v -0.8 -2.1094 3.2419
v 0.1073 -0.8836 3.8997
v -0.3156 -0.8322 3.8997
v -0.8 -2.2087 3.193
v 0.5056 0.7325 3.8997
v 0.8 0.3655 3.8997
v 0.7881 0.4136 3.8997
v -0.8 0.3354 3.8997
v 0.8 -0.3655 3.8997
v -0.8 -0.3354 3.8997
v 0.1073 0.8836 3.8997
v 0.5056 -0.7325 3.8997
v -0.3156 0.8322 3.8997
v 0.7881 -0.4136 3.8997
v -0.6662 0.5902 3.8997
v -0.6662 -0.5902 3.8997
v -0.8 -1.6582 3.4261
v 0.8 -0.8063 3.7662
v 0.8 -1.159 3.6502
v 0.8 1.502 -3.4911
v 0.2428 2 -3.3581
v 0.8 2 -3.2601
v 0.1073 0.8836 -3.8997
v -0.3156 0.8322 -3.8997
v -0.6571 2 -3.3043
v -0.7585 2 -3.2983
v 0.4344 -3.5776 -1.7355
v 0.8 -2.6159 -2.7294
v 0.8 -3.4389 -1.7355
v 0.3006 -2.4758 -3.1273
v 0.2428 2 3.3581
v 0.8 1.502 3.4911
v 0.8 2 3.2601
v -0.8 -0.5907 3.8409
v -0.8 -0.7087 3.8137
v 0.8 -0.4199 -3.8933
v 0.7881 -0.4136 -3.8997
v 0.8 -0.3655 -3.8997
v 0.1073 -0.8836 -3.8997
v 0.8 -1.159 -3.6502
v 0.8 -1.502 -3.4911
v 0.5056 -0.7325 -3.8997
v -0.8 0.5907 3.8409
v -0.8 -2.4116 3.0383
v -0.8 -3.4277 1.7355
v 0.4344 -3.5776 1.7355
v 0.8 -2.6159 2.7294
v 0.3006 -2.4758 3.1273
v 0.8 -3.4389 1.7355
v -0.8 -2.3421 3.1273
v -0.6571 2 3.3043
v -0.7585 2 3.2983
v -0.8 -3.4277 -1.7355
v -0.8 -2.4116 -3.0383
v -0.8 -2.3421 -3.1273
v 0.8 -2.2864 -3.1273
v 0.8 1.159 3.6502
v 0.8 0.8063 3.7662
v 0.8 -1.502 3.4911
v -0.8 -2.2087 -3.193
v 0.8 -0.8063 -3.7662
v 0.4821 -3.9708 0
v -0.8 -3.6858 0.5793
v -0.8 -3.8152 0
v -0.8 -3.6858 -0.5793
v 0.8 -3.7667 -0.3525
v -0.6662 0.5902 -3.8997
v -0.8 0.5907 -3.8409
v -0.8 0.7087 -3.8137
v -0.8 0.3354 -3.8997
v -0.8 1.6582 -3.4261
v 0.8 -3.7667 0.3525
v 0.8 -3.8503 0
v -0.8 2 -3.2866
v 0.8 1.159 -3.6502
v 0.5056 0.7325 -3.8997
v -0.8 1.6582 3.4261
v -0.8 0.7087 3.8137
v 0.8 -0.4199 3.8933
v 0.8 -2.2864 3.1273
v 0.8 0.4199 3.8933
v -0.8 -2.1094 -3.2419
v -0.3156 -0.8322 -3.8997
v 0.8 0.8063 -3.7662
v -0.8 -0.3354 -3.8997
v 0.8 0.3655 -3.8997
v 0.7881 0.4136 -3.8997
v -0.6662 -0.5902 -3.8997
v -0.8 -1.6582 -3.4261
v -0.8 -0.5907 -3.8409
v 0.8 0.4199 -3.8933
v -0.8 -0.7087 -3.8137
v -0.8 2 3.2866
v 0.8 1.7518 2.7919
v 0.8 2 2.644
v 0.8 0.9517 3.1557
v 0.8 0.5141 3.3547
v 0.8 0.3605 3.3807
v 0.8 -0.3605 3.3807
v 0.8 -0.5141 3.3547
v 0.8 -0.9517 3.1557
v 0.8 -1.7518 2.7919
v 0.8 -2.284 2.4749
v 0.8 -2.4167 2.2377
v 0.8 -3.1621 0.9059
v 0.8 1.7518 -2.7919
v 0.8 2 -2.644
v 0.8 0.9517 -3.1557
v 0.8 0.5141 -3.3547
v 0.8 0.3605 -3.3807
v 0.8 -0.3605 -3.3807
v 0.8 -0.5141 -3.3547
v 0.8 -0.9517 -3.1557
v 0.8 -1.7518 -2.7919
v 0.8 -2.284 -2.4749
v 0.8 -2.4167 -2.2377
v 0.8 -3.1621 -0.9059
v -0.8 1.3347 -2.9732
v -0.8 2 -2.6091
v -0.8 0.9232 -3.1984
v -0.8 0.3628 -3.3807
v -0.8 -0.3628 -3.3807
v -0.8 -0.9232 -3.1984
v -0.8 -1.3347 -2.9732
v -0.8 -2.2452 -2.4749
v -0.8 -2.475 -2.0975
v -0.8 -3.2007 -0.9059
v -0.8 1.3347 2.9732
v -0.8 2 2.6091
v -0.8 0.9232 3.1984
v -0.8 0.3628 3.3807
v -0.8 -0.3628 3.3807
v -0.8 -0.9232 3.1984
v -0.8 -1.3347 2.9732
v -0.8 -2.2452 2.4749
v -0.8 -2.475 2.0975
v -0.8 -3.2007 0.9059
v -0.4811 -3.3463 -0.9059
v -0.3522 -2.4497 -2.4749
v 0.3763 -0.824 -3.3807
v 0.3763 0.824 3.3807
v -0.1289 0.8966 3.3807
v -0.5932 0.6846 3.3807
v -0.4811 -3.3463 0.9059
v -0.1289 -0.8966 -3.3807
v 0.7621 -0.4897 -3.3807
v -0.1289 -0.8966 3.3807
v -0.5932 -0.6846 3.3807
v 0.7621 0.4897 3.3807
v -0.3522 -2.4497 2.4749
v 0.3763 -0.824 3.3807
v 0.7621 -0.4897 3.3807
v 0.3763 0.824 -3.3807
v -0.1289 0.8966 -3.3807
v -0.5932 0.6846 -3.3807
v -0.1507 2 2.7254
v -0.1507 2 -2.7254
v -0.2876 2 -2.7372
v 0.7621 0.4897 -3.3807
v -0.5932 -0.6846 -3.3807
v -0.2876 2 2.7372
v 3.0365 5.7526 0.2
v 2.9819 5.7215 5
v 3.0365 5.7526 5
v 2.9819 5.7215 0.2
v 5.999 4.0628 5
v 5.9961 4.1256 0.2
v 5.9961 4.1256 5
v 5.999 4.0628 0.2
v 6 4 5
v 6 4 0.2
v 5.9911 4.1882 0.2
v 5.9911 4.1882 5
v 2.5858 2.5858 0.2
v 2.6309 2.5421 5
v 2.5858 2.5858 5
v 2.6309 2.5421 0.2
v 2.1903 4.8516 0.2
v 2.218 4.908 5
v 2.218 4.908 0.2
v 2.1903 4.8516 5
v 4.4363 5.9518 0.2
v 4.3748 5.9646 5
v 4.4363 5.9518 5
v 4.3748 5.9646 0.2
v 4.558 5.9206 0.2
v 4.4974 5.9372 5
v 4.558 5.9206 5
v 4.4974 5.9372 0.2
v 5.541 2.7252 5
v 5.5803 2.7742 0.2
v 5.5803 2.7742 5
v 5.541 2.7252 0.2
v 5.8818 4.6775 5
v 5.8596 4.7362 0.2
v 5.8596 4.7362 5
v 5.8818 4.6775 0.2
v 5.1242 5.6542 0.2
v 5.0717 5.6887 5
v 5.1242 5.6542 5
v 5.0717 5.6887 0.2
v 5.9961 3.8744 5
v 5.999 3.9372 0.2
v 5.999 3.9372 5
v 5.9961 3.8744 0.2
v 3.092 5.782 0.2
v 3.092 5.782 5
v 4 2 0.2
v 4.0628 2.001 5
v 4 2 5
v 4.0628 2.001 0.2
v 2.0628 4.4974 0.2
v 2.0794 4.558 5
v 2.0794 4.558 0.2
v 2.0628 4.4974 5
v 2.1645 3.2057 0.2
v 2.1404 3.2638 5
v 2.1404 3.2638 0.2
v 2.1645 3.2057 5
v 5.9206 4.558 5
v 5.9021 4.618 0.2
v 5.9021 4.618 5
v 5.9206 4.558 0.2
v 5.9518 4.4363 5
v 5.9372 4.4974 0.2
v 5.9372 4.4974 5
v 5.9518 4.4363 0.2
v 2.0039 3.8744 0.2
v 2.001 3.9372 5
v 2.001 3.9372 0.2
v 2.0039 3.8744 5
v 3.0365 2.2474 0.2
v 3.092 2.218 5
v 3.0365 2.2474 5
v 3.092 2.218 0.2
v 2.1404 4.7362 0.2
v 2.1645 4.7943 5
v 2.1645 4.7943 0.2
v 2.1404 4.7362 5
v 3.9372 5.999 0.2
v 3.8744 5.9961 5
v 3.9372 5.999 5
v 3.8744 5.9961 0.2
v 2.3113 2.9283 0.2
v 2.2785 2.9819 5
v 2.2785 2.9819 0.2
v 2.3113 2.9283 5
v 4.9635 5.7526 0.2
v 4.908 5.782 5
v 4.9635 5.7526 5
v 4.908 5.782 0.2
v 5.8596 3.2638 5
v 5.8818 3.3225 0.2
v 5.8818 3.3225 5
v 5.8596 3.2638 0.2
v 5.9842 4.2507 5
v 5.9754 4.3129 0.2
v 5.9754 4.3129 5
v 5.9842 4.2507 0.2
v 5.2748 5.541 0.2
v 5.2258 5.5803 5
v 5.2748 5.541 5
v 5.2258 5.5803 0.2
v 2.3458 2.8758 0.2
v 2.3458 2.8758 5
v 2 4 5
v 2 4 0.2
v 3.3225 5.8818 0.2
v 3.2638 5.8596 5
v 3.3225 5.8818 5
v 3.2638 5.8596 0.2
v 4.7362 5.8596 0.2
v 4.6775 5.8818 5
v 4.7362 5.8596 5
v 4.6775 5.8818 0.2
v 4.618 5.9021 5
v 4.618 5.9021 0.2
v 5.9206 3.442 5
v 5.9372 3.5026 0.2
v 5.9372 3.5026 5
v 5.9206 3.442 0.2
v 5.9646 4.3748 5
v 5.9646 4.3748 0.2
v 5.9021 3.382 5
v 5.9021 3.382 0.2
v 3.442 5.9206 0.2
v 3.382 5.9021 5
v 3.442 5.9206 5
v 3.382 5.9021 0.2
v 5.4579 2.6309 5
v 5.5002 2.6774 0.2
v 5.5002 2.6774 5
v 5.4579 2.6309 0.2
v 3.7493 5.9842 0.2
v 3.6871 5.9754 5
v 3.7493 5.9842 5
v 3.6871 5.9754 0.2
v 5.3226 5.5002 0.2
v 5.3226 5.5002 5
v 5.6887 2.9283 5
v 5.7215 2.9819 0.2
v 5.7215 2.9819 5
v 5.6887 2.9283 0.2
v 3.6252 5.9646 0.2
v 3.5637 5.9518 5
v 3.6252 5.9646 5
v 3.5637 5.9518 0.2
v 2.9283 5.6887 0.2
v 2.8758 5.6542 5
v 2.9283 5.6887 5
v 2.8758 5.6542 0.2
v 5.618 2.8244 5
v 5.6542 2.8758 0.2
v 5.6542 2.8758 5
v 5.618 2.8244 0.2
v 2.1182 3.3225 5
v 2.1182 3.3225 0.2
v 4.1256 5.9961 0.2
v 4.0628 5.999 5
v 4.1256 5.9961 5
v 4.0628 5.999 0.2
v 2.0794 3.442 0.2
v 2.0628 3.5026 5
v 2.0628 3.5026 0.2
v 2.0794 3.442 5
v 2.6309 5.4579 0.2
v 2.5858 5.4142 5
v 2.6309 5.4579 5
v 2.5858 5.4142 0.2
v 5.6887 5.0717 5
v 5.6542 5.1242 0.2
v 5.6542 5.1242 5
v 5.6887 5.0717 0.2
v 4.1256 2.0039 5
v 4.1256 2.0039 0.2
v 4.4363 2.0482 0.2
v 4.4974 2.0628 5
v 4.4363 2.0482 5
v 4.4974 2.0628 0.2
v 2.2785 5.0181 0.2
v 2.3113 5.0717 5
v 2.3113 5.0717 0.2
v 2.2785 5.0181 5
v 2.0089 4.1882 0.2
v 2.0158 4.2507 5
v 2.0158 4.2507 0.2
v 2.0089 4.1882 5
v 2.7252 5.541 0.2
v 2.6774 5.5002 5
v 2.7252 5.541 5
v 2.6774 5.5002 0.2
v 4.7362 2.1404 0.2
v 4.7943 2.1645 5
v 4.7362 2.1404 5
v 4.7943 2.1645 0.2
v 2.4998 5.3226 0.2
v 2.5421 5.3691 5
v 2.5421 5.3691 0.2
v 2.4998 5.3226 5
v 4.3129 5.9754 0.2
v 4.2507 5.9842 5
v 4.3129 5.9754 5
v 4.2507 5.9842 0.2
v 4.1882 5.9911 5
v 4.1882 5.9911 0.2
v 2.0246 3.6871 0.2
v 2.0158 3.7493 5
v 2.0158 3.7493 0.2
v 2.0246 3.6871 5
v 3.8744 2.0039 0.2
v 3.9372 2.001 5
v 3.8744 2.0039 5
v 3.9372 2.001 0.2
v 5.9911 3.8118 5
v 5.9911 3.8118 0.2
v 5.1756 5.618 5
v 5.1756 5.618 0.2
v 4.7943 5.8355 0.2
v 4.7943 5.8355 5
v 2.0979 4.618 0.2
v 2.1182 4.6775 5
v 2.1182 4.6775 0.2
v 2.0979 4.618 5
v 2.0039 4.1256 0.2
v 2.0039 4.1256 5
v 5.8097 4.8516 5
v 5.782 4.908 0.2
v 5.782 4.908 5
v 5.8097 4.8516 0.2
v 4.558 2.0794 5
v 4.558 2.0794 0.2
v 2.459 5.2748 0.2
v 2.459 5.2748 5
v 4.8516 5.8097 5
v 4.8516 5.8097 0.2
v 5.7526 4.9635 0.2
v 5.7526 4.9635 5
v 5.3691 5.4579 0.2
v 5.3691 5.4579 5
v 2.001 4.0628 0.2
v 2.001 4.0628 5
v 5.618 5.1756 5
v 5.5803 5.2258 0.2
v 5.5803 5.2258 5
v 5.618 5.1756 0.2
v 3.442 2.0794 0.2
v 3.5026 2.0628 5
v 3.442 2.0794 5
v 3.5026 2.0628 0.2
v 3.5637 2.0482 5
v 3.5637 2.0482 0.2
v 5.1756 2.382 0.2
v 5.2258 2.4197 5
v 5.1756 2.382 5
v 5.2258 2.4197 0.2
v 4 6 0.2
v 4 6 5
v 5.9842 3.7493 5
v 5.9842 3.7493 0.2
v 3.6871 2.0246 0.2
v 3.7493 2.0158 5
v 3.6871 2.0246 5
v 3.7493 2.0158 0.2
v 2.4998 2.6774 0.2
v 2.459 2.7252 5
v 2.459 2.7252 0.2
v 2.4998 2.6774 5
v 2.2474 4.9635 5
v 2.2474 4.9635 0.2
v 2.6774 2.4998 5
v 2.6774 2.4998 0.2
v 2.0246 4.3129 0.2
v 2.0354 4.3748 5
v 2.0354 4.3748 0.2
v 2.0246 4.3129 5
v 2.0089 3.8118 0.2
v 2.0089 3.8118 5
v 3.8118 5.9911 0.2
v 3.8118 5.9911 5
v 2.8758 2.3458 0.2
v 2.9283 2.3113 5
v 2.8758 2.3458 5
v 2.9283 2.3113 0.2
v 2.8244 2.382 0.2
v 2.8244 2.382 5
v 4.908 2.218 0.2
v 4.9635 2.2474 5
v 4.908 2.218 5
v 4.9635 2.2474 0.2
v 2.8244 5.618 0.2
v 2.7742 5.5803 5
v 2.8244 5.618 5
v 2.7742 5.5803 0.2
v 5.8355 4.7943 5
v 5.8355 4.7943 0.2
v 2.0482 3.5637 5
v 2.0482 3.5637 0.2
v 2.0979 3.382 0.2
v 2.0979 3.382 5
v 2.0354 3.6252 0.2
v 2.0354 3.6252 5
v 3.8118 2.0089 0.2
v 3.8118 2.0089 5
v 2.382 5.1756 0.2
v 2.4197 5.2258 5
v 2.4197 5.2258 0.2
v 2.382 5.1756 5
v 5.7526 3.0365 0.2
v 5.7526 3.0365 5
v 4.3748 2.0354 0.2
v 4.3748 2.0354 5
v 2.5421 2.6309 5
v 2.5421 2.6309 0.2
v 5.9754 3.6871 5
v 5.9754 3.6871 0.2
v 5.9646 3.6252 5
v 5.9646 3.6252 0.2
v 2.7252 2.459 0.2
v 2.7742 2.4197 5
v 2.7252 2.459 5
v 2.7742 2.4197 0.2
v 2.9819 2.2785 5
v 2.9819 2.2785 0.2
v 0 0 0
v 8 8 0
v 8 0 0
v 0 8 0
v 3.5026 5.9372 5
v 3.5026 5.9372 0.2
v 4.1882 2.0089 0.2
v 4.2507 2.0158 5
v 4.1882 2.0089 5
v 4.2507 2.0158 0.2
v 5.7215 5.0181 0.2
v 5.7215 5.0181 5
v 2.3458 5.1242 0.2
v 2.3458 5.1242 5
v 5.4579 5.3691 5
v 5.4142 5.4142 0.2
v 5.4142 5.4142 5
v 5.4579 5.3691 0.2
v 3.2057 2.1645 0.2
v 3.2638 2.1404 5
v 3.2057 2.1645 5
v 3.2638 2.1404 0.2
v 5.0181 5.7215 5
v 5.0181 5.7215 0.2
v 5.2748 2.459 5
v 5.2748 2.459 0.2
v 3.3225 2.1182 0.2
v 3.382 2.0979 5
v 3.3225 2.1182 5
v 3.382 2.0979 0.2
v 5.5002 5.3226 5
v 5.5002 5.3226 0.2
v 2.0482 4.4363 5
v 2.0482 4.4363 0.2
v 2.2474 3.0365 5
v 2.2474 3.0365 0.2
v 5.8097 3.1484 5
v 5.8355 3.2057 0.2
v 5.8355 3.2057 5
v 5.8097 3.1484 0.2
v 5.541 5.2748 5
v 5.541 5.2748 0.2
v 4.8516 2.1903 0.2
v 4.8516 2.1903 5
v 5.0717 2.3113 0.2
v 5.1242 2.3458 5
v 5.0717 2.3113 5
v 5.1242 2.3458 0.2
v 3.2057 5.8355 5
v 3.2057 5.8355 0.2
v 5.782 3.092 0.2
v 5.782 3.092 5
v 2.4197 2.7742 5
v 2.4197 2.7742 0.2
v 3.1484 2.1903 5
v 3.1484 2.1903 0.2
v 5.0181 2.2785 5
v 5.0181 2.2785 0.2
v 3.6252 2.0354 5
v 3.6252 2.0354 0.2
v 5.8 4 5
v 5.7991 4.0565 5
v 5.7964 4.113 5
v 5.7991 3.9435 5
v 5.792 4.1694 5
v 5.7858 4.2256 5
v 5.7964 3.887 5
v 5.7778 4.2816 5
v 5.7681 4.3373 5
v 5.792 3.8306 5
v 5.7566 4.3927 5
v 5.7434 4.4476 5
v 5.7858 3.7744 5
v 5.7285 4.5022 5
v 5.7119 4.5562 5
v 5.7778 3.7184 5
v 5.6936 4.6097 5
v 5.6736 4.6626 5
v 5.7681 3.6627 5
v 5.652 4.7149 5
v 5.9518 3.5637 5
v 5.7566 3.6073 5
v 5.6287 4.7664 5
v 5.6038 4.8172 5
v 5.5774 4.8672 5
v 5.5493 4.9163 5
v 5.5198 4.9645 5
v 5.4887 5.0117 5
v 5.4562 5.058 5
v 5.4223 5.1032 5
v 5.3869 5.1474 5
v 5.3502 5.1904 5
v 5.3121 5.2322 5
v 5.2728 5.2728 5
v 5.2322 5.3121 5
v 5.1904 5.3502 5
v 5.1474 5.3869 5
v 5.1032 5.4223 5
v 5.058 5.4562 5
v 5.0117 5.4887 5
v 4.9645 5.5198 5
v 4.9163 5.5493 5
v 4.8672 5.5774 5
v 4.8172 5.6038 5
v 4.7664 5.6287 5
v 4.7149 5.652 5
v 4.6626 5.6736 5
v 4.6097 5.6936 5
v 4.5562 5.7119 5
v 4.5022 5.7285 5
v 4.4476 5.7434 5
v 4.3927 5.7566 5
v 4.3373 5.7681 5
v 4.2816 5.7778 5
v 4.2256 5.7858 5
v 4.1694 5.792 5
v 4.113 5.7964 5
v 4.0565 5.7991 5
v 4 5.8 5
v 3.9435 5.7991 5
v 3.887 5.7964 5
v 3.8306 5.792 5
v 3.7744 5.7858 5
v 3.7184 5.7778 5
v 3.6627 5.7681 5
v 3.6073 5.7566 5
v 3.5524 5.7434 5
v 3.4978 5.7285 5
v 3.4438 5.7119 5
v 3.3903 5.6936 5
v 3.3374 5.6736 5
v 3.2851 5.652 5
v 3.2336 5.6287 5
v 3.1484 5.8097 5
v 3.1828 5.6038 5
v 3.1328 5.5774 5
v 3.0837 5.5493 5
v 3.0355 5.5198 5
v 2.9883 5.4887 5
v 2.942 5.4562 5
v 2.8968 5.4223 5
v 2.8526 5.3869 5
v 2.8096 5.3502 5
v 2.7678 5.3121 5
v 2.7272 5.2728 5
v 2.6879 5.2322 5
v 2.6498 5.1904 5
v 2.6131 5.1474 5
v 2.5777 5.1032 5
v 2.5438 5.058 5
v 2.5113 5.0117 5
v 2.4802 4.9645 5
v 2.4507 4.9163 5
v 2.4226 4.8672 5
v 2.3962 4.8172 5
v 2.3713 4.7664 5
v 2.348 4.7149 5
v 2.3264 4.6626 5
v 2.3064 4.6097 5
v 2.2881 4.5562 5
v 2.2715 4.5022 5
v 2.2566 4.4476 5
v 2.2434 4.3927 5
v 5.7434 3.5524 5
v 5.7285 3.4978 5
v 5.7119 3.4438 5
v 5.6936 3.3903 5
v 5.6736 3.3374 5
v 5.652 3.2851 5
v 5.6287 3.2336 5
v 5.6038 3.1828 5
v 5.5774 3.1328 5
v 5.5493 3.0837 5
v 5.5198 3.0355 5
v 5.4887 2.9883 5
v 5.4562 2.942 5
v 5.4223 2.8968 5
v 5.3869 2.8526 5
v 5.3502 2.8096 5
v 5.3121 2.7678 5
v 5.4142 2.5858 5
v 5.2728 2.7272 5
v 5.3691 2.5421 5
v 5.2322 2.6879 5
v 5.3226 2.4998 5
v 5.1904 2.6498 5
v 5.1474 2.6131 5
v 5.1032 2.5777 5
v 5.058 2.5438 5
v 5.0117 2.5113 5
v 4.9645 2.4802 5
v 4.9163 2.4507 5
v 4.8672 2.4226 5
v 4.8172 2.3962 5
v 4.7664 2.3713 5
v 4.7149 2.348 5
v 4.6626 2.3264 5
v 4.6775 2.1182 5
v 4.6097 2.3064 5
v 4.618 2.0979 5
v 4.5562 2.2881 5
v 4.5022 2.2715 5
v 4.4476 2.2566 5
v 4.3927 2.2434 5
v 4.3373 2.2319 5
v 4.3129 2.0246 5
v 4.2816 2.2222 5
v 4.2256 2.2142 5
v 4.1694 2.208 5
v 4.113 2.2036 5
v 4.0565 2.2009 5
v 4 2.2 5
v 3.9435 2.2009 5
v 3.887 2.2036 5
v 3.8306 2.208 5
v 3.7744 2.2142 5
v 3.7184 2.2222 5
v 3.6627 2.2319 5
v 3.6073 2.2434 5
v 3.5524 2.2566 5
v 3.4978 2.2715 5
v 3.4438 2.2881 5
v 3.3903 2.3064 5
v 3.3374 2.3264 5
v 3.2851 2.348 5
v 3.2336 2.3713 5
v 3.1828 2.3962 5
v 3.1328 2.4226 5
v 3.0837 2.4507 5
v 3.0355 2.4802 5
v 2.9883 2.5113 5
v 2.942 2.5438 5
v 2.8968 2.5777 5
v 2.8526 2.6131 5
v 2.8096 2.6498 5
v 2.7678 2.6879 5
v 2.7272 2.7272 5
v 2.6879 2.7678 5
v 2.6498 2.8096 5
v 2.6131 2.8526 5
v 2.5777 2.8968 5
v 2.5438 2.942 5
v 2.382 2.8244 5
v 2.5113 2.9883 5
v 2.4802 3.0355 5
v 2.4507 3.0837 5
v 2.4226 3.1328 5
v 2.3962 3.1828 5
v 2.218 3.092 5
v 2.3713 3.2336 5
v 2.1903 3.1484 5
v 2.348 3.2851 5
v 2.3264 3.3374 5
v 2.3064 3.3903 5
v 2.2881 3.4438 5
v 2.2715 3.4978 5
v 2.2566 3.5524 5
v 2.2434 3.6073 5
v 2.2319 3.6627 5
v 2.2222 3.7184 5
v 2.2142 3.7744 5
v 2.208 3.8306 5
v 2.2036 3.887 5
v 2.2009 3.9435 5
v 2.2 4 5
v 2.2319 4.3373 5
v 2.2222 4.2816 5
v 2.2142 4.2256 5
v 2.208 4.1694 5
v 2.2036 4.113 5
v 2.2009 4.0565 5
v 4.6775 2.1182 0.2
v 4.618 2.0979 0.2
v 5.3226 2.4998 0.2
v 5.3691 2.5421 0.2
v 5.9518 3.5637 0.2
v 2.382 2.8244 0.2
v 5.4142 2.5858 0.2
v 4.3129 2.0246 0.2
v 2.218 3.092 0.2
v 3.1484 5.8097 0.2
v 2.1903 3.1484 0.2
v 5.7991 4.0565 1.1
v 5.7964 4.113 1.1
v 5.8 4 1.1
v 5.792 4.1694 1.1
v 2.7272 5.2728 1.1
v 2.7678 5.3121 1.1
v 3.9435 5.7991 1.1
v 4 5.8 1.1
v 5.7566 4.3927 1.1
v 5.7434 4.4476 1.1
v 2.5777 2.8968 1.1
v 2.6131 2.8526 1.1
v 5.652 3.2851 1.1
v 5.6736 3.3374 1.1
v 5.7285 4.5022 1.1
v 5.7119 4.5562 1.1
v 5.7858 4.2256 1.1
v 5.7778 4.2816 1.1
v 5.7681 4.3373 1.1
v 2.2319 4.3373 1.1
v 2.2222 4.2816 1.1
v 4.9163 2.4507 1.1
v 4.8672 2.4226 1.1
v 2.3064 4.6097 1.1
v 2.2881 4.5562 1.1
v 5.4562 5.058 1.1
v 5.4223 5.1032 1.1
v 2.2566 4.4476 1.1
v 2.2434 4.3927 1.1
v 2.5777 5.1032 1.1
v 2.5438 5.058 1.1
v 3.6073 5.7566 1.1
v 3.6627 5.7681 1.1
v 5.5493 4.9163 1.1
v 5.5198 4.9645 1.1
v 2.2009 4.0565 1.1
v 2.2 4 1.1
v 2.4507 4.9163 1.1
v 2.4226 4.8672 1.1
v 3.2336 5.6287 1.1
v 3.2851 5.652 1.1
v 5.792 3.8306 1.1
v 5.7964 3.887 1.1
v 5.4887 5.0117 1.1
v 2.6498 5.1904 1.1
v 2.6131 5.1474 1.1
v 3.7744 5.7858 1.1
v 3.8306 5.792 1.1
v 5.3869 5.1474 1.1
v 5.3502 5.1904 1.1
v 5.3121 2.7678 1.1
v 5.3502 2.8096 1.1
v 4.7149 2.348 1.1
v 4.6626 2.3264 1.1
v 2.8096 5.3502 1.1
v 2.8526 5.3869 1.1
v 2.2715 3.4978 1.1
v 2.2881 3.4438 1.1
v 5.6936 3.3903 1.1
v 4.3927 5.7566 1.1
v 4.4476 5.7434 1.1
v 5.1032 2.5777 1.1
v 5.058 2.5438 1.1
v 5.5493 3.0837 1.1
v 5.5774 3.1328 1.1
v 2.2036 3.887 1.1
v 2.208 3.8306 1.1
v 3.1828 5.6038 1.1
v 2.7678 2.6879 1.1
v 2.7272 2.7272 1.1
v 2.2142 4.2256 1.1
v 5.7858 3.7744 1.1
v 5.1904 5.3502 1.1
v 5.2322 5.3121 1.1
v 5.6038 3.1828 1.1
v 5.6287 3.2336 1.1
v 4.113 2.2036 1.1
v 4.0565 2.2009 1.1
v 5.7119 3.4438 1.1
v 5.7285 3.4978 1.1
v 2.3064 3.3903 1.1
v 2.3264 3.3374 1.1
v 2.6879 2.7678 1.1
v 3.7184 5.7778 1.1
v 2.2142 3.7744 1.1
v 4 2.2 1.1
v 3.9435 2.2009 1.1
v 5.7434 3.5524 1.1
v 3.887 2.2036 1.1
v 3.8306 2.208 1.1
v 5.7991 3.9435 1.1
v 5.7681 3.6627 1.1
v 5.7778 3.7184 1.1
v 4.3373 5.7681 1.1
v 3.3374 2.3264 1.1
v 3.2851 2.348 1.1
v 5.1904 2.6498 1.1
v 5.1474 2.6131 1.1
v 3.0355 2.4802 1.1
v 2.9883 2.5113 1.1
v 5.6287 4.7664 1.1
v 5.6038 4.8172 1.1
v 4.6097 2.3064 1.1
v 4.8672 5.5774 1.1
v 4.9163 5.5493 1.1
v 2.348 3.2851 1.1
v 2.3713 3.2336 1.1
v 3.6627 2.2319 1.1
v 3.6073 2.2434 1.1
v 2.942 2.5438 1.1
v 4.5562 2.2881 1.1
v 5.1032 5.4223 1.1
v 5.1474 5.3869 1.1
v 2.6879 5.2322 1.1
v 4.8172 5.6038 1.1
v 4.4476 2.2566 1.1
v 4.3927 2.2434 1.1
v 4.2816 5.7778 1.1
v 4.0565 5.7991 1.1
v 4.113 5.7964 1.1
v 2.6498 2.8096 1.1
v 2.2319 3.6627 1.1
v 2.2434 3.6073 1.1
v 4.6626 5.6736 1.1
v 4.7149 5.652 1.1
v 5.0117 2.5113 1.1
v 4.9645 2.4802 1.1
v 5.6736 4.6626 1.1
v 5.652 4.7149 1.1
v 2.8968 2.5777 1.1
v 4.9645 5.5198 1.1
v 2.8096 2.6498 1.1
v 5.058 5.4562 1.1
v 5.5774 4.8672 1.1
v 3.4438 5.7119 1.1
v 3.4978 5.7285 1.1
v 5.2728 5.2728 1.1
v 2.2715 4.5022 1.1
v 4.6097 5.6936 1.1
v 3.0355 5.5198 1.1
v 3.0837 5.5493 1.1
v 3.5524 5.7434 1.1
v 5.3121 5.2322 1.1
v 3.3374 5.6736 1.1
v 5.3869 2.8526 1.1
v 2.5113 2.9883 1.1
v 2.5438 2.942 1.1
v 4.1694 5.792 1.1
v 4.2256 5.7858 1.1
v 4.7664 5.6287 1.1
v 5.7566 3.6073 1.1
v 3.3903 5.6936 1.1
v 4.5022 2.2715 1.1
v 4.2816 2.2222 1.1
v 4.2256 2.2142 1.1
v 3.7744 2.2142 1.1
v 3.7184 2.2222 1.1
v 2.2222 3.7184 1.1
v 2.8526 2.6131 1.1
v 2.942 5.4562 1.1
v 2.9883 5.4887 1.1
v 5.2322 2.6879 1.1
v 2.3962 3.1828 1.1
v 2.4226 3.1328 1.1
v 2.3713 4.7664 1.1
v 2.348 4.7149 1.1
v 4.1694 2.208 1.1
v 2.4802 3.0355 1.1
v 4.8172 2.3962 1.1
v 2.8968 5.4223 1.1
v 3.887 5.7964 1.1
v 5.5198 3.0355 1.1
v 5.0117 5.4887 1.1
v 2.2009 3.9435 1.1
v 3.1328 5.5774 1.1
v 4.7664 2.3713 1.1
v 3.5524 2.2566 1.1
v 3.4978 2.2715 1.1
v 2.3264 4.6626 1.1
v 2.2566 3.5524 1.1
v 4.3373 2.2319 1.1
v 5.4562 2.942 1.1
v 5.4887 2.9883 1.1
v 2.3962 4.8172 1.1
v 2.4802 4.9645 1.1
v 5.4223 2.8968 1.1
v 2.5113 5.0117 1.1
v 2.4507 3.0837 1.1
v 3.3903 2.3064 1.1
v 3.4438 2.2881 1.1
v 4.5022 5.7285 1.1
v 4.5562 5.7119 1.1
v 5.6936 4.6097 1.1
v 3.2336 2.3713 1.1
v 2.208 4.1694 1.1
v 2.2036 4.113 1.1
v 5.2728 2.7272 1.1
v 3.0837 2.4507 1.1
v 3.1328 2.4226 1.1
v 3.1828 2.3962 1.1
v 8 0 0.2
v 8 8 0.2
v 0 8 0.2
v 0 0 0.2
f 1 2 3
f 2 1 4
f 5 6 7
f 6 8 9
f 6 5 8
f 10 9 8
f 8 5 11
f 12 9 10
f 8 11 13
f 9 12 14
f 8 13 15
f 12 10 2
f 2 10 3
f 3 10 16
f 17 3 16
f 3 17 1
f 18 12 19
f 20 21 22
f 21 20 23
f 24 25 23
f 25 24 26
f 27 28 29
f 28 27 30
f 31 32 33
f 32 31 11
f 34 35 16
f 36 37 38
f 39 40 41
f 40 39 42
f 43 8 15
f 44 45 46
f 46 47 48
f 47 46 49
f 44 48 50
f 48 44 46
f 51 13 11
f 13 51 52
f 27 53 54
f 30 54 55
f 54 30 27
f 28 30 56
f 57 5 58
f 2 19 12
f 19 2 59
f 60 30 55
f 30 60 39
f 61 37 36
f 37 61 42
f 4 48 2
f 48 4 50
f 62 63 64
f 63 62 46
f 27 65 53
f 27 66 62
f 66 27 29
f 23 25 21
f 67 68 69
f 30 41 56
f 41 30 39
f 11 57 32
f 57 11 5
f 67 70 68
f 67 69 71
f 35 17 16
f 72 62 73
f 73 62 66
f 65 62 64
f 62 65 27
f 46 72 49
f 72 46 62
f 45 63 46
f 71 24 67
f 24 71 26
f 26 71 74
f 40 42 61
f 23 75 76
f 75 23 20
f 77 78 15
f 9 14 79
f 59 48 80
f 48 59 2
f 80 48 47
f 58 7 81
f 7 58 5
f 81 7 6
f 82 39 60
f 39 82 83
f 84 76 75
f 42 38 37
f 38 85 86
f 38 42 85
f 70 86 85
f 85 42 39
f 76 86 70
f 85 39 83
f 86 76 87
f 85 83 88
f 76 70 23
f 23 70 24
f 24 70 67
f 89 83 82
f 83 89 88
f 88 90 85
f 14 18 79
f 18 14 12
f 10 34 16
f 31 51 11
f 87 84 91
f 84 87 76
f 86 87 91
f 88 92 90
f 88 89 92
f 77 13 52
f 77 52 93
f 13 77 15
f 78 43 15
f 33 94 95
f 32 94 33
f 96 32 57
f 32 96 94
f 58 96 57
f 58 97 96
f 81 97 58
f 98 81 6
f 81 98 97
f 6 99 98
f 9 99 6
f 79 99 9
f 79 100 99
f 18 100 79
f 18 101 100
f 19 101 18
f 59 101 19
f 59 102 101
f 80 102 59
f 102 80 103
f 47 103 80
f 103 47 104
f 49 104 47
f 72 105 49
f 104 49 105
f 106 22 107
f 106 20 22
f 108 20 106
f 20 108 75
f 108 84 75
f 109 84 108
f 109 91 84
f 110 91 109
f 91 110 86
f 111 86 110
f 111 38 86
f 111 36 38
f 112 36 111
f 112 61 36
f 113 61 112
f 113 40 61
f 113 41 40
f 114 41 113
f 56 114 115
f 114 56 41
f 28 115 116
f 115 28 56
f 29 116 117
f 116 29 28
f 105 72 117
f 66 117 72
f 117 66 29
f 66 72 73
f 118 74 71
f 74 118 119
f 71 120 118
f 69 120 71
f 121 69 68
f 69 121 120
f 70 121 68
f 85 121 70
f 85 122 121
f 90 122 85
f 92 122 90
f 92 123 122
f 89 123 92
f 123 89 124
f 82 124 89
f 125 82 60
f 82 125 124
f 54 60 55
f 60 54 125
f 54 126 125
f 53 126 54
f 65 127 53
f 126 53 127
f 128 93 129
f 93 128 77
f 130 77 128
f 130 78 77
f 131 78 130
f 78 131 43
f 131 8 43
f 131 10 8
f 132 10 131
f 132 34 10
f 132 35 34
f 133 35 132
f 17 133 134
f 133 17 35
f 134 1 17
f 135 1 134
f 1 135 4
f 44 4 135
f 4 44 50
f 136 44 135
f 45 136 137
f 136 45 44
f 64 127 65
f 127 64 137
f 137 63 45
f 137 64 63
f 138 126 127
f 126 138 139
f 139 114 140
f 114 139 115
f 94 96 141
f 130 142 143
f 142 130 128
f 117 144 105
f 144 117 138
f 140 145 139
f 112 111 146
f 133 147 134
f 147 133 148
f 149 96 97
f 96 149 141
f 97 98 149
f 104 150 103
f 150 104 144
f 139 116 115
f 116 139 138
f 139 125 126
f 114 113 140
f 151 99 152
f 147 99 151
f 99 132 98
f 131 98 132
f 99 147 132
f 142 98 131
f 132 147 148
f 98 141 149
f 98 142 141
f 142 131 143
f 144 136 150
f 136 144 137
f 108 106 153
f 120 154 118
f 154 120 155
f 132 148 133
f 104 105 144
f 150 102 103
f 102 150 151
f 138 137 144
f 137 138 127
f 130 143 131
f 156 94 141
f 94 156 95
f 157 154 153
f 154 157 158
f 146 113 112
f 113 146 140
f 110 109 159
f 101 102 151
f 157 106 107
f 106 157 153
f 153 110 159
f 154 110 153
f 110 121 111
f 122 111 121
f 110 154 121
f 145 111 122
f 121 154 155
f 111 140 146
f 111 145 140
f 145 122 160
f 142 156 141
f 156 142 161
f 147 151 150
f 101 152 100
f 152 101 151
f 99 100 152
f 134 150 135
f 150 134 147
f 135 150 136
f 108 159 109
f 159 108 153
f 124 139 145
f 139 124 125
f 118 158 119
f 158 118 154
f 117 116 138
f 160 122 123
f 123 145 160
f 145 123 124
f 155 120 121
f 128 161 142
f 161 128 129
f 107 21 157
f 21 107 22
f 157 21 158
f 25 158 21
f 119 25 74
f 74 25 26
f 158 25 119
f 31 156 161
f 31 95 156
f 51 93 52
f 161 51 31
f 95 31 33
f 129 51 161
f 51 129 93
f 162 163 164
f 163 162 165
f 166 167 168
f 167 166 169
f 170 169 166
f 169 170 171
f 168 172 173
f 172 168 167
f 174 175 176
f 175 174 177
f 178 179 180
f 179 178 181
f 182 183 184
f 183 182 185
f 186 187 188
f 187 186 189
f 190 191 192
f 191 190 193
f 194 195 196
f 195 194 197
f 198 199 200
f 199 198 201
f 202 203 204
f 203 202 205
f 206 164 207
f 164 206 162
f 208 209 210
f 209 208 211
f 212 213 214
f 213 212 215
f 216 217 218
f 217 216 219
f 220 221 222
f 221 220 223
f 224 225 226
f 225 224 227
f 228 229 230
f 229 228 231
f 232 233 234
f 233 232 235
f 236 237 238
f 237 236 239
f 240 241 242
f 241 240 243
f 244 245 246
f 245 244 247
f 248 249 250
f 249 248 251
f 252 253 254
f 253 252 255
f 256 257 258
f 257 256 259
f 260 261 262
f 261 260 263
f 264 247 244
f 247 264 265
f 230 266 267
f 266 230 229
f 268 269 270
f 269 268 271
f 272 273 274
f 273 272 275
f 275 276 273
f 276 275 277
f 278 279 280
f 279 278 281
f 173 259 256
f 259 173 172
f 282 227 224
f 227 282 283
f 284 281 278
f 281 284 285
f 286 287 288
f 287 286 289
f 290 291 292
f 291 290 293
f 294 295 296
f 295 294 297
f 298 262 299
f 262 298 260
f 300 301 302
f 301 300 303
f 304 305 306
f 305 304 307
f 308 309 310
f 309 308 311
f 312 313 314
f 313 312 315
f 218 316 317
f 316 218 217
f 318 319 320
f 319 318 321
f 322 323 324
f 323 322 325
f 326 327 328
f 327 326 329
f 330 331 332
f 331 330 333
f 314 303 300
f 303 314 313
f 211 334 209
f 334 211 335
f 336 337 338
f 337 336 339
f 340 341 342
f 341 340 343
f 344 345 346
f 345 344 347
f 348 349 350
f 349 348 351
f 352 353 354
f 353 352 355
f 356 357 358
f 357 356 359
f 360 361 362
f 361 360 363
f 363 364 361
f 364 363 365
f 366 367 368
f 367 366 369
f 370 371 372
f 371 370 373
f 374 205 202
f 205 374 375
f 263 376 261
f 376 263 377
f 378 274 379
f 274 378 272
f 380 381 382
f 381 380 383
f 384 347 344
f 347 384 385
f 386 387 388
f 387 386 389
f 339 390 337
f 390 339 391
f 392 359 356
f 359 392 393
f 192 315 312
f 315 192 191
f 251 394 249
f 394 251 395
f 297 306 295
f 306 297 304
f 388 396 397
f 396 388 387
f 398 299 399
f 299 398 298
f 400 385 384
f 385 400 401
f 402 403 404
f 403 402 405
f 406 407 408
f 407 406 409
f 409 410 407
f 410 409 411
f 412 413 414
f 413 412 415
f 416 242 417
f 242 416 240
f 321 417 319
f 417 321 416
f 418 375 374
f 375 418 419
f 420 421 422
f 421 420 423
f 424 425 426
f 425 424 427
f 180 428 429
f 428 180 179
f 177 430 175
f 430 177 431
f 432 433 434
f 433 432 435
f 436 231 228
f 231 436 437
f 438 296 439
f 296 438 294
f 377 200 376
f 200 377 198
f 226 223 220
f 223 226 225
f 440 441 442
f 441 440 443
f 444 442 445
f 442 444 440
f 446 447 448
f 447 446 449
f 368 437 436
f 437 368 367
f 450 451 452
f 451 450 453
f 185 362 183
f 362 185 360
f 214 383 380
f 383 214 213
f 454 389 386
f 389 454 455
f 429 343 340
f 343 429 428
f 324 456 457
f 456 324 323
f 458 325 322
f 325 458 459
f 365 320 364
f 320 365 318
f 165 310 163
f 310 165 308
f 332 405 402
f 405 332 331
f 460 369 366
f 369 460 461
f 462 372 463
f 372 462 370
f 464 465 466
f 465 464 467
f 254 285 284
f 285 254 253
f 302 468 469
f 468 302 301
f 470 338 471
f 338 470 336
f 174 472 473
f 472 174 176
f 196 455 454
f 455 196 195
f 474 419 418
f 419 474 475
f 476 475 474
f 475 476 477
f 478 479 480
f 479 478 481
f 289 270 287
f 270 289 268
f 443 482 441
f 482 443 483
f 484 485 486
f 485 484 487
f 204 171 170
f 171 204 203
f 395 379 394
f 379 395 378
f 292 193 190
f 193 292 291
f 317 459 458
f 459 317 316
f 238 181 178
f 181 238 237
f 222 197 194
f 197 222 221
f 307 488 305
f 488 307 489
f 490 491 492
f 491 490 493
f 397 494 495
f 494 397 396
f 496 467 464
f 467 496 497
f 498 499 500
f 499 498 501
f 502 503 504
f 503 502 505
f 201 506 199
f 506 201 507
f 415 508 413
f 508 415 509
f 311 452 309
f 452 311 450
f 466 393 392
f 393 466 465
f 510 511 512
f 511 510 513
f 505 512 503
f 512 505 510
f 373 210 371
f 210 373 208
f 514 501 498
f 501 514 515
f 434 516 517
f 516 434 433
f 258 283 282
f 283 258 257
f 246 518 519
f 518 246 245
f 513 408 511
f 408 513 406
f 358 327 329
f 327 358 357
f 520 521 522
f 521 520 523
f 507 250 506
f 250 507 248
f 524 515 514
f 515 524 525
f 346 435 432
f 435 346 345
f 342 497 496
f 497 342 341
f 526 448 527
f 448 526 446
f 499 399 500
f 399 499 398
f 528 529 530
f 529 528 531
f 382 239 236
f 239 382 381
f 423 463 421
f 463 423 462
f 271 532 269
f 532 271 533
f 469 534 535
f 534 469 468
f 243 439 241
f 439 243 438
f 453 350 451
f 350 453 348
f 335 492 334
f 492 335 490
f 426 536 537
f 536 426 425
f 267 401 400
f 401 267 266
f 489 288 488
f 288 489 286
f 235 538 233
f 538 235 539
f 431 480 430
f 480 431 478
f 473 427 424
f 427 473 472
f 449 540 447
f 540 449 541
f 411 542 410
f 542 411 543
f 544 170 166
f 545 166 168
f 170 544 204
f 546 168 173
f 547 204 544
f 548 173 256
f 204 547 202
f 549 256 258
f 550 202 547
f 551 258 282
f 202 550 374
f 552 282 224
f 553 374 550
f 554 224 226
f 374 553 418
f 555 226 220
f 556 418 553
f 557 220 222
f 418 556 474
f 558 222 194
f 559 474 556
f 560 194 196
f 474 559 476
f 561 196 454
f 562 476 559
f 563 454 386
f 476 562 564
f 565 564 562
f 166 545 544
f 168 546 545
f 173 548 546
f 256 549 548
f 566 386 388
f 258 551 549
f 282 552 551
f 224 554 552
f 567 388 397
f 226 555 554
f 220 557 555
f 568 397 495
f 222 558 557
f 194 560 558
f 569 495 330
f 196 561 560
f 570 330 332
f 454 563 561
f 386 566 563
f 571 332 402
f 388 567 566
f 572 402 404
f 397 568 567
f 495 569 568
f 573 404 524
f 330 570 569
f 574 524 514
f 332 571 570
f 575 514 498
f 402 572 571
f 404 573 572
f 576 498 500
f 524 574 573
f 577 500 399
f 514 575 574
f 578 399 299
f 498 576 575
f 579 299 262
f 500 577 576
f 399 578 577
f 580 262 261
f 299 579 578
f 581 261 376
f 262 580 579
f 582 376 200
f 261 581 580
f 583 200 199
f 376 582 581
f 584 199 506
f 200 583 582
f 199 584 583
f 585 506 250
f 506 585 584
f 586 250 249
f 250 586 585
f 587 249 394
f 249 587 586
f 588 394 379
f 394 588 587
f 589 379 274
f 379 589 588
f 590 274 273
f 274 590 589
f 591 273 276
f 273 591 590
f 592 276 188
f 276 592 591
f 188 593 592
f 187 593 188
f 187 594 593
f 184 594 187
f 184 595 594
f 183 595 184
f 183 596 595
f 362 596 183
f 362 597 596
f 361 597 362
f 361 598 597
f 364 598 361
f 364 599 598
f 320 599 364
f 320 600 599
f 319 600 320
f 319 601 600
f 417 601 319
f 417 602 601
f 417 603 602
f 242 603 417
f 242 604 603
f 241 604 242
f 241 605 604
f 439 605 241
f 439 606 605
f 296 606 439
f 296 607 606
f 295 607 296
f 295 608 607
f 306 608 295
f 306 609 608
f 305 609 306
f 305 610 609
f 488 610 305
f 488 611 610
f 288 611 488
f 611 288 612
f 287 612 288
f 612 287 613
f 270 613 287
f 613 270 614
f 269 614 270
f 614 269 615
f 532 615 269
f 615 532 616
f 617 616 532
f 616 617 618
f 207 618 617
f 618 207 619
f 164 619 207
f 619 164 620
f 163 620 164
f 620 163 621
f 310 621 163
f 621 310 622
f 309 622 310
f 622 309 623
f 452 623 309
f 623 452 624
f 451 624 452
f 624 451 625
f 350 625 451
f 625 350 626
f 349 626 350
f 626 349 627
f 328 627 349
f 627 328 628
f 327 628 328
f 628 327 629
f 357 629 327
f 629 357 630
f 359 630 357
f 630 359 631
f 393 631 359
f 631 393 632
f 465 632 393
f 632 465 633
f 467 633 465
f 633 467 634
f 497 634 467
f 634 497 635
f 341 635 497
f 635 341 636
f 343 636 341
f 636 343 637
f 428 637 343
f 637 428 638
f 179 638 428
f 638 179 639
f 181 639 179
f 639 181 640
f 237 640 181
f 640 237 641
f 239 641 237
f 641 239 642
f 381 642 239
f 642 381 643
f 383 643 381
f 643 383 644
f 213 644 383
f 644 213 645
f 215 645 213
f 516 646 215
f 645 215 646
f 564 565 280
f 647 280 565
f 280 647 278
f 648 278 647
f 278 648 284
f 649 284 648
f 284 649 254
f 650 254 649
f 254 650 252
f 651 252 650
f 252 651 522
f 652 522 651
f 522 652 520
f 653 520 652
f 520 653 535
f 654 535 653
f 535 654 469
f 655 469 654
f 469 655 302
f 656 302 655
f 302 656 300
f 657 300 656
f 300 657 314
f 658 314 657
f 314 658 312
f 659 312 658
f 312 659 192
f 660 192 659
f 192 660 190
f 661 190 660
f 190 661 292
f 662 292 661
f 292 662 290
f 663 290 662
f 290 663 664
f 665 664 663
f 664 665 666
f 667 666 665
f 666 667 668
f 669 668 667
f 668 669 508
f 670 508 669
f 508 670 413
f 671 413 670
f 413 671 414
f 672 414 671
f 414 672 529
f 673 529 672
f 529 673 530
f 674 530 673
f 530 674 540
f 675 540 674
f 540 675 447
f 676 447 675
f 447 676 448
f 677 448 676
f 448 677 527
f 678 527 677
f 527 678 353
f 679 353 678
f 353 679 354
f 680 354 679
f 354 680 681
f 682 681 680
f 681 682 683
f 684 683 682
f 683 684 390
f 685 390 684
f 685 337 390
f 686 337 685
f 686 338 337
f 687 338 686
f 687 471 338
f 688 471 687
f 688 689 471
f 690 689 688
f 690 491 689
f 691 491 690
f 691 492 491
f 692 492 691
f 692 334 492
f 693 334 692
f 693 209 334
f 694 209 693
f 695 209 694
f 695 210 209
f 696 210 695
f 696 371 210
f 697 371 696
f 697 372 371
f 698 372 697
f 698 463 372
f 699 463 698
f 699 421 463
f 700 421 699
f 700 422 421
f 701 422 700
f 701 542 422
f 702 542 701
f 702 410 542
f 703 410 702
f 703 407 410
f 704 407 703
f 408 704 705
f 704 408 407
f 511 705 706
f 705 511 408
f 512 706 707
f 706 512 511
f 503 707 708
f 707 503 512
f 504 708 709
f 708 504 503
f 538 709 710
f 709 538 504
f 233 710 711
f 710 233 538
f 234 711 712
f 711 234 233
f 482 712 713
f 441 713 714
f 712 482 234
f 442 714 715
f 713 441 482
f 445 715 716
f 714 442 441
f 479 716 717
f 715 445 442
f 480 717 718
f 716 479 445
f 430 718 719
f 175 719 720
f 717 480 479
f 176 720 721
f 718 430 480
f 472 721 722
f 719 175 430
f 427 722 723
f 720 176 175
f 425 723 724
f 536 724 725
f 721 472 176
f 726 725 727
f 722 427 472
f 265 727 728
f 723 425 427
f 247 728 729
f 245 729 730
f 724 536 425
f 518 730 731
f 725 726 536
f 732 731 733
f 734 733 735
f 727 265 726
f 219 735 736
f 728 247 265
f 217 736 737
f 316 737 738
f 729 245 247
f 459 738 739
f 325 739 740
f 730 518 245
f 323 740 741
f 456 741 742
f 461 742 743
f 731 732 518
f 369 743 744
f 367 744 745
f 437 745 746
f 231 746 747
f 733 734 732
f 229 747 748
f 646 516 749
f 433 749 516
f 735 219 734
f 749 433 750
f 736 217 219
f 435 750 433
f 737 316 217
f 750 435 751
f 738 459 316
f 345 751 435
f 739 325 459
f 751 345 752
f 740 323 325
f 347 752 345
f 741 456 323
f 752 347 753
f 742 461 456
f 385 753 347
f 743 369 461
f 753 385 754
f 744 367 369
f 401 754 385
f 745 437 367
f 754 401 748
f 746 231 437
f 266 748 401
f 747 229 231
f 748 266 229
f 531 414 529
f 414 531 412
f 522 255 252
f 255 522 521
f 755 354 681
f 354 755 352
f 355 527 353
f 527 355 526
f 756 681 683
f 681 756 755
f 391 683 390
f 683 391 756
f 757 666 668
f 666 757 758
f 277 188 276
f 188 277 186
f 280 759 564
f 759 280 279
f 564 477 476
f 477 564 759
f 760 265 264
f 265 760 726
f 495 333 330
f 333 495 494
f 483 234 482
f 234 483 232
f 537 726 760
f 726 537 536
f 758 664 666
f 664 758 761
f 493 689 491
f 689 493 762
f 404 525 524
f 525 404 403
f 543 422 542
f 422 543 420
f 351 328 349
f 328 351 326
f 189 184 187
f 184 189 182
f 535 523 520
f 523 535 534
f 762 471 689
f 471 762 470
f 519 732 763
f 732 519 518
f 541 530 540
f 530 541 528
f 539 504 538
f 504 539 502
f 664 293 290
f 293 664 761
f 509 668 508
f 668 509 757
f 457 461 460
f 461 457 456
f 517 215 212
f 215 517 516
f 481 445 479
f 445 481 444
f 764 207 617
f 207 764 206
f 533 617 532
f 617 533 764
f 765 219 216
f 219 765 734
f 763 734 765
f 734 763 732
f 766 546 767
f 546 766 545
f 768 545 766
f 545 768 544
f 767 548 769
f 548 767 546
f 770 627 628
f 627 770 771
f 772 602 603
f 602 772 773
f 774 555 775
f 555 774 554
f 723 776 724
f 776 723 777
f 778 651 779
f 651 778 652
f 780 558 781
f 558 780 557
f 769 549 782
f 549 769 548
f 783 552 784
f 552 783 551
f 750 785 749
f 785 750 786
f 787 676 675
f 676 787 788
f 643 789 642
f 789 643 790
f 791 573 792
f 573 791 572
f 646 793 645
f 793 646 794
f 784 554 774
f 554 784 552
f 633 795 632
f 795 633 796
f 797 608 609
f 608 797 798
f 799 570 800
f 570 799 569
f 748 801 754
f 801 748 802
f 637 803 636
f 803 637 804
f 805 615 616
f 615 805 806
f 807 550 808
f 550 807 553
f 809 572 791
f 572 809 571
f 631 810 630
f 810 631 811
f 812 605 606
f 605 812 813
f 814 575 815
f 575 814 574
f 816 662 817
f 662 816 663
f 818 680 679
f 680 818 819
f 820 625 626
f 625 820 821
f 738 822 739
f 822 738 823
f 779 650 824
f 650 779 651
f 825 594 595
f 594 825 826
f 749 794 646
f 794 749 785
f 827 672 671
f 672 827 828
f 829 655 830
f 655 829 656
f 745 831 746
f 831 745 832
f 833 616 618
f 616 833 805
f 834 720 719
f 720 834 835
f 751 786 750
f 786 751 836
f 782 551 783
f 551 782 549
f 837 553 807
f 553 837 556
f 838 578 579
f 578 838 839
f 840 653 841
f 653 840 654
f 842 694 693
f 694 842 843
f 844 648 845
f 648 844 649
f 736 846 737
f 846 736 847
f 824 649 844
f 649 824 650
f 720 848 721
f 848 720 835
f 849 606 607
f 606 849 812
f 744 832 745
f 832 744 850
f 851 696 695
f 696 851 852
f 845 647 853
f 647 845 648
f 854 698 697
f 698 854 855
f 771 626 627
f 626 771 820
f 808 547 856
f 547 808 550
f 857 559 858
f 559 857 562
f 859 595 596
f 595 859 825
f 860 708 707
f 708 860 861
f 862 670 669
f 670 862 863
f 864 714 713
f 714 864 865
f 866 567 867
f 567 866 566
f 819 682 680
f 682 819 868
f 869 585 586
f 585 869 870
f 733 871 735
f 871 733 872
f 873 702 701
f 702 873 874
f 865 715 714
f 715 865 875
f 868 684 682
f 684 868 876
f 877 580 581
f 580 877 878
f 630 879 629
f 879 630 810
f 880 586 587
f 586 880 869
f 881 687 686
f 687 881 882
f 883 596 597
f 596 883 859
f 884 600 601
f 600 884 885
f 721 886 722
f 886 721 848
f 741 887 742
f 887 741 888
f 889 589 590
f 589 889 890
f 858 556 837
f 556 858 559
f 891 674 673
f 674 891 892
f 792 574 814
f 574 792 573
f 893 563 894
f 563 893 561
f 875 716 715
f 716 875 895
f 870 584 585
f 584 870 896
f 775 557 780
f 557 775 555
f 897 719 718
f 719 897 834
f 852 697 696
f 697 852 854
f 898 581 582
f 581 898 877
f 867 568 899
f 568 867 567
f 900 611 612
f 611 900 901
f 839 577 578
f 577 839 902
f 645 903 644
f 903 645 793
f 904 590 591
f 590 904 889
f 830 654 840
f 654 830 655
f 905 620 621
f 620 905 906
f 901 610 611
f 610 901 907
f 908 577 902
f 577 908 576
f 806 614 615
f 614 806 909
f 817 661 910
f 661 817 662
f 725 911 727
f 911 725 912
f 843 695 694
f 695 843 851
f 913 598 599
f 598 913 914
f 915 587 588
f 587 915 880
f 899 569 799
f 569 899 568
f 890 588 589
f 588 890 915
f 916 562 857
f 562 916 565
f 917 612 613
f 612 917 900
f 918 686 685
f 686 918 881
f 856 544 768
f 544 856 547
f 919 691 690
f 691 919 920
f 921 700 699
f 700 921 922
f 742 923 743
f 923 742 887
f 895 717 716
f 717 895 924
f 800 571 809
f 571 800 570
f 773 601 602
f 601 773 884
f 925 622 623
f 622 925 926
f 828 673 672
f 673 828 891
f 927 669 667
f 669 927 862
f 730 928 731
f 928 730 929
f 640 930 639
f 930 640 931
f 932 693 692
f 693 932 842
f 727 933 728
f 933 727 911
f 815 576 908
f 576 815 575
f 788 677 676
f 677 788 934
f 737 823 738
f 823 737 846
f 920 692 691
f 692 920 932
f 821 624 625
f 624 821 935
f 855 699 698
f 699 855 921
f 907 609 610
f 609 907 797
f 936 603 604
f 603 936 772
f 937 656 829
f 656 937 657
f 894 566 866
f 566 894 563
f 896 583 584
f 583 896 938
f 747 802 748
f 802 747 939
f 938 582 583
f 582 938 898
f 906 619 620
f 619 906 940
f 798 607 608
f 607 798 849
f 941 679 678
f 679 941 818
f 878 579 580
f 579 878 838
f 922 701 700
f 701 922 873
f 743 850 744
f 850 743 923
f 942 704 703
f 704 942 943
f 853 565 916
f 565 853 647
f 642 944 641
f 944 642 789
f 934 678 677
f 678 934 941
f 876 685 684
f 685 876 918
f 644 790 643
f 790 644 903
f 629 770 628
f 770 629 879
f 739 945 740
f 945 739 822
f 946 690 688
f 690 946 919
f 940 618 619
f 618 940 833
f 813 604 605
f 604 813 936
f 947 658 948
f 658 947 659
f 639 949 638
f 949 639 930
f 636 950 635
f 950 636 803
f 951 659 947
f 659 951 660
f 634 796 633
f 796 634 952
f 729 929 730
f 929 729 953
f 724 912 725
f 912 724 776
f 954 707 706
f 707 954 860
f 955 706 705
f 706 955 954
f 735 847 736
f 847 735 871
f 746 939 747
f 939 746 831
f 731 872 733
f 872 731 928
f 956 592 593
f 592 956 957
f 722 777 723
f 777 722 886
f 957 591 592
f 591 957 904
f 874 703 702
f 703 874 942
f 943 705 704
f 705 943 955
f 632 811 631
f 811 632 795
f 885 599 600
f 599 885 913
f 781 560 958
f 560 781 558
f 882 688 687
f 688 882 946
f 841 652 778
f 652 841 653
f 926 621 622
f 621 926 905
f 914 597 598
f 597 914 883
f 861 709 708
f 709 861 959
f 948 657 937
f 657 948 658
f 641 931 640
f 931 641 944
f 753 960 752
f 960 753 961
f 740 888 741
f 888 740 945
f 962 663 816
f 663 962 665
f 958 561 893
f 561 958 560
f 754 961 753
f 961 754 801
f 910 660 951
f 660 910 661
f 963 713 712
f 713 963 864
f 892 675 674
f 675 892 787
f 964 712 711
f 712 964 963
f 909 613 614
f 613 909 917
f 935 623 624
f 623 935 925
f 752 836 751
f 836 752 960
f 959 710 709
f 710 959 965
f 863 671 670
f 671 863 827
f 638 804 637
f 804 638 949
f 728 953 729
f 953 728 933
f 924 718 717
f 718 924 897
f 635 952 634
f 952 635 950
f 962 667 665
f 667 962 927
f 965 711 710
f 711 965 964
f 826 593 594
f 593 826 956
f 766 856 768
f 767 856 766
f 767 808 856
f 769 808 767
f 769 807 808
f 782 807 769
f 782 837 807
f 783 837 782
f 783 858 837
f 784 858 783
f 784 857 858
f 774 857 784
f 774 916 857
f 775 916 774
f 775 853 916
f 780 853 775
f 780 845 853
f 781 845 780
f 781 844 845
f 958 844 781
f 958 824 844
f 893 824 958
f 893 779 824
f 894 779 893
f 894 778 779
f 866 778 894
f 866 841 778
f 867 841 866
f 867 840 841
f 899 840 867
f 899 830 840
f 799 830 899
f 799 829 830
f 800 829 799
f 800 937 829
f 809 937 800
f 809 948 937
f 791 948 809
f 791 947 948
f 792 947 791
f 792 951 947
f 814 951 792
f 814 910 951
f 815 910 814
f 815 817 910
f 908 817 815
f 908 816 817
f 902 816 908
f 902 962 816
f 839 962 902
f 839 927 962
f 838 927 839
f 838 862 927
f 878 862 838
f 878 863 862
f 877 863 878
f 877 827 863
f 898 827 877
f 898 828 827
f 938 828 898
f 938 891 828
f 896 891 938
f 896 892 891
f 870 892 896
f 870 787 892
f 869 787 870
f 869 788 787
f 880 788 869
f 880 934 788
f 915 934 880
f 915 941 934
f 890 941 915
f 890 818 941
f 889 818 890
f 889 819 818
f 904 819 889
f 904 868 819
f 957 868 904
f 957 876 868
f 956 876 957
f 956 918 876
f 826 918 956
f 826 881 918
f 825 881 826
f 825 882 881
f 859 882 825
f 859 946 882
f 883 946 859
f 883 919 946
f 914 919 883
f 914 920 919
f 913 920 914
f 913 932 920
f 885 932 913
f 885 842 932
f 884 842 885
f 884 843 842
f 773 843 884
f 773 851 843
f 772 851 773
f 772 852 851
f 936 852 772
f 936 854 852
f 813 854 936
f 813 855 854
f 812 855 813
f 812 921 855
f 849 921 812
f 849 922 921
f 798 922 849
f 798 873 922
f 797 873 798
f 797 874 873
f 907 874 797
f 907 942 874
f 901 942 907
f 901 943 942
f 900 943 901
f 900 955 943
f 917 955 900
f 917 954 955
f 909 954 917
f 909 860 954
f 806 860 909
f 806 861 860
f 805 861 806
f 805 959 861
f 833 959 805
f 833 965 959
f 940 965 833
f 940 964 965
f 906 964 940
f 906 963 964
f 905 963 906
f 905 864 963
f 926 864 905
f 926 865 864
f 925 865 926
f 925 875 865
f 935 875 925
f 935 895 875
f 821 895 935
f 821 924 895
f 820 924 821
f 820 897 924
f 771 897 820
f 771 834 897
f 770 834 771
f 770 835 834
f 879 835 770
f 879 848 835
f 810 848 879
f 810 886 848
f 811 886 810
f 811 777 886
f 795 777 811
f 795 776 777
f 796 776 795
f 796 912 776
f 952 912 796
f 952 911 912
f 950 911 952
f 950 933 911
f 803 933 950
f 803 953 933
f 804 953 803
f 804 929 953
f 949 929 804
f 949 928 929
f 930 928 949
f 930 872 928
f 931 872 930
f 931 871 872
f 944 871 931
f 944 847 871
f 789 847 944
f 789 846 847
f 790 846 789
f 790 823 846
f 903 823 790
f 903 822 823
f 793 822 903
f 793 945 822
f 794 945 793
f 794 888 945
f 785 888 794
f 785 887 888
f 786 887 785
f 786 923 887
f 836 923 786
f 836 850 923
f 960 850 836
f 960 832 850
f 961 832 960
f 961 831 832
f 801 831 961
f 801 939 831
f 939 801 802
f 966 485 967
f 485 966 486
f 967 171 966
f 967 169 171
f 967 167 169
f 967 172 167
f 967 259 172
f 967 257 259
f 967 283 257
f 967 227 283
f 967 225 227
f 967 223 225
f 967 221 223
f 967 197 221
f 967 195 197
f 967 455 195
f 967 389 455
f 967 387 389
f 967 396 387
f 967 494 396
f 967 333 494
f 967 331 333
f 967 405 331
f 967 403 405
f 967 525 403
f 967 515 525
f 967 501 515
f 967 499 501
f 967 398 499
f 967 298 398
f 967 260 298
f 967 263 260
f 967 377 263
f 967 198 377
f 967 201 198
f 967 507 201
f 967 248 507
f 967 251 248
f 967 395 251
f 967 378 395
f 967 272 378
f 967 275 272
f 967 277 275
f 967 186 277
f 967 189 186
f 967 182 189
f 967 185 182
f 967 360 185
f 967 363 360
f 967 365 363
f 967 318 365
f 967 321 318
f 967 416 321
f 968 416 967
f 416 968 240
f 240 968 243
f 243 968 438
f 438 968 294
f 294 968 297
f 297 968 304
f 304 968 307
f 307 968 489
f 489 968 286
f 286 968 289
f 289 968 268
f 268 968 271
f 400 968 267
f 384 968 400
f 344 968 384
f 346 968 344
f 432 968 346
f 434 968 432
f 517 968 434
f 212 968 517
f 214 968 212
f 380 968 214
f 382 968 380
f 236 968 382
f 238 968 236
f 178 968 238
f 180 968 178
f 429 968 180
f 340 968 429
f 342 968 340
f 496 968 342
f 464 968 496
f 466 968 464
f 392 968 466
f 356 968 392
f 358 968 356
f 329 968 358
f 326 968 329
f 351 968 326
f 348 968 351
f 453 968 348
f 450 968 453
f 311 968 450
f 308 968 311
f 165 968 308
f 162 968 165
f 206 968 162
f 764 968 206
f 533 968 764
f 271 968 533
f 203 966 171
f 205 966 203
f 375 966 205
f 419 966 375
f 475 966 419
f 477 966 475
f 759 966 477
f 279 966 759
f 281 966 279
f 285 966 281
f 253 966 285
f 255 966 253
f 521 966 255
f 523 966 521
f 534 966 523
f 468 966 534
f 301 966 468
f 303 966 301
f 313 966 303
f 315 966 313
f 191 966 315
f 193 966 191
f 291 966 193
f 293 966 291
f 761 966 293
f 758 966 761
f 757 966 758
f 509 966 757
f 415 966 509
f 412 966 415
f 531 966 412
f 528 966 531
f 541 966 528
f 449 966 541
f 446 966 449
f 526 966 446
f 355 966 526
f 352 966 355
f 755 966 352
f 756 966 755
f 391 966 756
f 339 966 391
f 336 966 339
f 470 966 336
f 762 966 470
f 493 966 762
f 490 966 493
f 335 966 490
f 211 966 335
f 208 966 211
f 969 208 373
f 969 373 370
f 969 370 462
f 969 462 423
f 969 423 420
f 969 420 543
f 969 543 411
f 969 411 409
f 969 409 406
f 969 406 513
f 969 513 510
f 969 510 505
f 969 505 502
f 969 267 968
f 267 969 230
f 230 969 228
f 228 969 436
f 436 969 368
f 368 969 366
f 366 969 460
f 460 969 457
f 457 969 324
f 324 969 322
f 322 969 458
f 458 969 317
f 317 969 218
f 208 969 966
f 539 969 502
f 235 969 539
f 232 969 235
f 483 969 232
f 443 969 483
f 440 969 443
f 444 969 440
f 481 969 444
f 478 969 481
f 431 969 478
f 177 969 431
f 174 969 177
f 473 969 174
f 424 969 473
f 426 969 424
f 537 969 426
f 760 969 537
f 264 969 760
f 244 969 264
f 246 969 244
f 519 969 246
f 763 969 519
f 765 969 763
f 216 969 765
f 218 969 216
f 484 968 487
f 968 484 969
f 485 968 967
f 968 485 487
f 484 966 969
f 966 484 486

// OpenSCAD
module recipient(inaltime_recipient,raza_recipient)   
translate([4,4,0])
difference(){
cylinder (h=inaltime_recipient,r=raza_recipient,$fn=200);
    translate([0,0,inaltime_recipient-(inaltime_recipient-1.1)])
    cylinder (h=inaltime_recipient-1,r=raza_recipient-0.2,$fn=200);
}

module toarta(raza_toarta)
difference(){
difference(){
difference(){
difference(){
sphere(raza_toarta);
    translate([0.8,-4,-5])
    cube([10,10,10]);
}
translate([-10.8,-4,-5])
    cube([10,10,10]);
}
sphere(raza_toarta-0.5);
}
translate([-2,2,-5])
cube([10,10,10]);
}


module suport(lungime_suport,latime_suport,inaltime_suport)
cube([lungime_suport,latime_suport,inaltime_suport]);

suport(8,8,0.2);
toarta(4);
recipient(5,2);
